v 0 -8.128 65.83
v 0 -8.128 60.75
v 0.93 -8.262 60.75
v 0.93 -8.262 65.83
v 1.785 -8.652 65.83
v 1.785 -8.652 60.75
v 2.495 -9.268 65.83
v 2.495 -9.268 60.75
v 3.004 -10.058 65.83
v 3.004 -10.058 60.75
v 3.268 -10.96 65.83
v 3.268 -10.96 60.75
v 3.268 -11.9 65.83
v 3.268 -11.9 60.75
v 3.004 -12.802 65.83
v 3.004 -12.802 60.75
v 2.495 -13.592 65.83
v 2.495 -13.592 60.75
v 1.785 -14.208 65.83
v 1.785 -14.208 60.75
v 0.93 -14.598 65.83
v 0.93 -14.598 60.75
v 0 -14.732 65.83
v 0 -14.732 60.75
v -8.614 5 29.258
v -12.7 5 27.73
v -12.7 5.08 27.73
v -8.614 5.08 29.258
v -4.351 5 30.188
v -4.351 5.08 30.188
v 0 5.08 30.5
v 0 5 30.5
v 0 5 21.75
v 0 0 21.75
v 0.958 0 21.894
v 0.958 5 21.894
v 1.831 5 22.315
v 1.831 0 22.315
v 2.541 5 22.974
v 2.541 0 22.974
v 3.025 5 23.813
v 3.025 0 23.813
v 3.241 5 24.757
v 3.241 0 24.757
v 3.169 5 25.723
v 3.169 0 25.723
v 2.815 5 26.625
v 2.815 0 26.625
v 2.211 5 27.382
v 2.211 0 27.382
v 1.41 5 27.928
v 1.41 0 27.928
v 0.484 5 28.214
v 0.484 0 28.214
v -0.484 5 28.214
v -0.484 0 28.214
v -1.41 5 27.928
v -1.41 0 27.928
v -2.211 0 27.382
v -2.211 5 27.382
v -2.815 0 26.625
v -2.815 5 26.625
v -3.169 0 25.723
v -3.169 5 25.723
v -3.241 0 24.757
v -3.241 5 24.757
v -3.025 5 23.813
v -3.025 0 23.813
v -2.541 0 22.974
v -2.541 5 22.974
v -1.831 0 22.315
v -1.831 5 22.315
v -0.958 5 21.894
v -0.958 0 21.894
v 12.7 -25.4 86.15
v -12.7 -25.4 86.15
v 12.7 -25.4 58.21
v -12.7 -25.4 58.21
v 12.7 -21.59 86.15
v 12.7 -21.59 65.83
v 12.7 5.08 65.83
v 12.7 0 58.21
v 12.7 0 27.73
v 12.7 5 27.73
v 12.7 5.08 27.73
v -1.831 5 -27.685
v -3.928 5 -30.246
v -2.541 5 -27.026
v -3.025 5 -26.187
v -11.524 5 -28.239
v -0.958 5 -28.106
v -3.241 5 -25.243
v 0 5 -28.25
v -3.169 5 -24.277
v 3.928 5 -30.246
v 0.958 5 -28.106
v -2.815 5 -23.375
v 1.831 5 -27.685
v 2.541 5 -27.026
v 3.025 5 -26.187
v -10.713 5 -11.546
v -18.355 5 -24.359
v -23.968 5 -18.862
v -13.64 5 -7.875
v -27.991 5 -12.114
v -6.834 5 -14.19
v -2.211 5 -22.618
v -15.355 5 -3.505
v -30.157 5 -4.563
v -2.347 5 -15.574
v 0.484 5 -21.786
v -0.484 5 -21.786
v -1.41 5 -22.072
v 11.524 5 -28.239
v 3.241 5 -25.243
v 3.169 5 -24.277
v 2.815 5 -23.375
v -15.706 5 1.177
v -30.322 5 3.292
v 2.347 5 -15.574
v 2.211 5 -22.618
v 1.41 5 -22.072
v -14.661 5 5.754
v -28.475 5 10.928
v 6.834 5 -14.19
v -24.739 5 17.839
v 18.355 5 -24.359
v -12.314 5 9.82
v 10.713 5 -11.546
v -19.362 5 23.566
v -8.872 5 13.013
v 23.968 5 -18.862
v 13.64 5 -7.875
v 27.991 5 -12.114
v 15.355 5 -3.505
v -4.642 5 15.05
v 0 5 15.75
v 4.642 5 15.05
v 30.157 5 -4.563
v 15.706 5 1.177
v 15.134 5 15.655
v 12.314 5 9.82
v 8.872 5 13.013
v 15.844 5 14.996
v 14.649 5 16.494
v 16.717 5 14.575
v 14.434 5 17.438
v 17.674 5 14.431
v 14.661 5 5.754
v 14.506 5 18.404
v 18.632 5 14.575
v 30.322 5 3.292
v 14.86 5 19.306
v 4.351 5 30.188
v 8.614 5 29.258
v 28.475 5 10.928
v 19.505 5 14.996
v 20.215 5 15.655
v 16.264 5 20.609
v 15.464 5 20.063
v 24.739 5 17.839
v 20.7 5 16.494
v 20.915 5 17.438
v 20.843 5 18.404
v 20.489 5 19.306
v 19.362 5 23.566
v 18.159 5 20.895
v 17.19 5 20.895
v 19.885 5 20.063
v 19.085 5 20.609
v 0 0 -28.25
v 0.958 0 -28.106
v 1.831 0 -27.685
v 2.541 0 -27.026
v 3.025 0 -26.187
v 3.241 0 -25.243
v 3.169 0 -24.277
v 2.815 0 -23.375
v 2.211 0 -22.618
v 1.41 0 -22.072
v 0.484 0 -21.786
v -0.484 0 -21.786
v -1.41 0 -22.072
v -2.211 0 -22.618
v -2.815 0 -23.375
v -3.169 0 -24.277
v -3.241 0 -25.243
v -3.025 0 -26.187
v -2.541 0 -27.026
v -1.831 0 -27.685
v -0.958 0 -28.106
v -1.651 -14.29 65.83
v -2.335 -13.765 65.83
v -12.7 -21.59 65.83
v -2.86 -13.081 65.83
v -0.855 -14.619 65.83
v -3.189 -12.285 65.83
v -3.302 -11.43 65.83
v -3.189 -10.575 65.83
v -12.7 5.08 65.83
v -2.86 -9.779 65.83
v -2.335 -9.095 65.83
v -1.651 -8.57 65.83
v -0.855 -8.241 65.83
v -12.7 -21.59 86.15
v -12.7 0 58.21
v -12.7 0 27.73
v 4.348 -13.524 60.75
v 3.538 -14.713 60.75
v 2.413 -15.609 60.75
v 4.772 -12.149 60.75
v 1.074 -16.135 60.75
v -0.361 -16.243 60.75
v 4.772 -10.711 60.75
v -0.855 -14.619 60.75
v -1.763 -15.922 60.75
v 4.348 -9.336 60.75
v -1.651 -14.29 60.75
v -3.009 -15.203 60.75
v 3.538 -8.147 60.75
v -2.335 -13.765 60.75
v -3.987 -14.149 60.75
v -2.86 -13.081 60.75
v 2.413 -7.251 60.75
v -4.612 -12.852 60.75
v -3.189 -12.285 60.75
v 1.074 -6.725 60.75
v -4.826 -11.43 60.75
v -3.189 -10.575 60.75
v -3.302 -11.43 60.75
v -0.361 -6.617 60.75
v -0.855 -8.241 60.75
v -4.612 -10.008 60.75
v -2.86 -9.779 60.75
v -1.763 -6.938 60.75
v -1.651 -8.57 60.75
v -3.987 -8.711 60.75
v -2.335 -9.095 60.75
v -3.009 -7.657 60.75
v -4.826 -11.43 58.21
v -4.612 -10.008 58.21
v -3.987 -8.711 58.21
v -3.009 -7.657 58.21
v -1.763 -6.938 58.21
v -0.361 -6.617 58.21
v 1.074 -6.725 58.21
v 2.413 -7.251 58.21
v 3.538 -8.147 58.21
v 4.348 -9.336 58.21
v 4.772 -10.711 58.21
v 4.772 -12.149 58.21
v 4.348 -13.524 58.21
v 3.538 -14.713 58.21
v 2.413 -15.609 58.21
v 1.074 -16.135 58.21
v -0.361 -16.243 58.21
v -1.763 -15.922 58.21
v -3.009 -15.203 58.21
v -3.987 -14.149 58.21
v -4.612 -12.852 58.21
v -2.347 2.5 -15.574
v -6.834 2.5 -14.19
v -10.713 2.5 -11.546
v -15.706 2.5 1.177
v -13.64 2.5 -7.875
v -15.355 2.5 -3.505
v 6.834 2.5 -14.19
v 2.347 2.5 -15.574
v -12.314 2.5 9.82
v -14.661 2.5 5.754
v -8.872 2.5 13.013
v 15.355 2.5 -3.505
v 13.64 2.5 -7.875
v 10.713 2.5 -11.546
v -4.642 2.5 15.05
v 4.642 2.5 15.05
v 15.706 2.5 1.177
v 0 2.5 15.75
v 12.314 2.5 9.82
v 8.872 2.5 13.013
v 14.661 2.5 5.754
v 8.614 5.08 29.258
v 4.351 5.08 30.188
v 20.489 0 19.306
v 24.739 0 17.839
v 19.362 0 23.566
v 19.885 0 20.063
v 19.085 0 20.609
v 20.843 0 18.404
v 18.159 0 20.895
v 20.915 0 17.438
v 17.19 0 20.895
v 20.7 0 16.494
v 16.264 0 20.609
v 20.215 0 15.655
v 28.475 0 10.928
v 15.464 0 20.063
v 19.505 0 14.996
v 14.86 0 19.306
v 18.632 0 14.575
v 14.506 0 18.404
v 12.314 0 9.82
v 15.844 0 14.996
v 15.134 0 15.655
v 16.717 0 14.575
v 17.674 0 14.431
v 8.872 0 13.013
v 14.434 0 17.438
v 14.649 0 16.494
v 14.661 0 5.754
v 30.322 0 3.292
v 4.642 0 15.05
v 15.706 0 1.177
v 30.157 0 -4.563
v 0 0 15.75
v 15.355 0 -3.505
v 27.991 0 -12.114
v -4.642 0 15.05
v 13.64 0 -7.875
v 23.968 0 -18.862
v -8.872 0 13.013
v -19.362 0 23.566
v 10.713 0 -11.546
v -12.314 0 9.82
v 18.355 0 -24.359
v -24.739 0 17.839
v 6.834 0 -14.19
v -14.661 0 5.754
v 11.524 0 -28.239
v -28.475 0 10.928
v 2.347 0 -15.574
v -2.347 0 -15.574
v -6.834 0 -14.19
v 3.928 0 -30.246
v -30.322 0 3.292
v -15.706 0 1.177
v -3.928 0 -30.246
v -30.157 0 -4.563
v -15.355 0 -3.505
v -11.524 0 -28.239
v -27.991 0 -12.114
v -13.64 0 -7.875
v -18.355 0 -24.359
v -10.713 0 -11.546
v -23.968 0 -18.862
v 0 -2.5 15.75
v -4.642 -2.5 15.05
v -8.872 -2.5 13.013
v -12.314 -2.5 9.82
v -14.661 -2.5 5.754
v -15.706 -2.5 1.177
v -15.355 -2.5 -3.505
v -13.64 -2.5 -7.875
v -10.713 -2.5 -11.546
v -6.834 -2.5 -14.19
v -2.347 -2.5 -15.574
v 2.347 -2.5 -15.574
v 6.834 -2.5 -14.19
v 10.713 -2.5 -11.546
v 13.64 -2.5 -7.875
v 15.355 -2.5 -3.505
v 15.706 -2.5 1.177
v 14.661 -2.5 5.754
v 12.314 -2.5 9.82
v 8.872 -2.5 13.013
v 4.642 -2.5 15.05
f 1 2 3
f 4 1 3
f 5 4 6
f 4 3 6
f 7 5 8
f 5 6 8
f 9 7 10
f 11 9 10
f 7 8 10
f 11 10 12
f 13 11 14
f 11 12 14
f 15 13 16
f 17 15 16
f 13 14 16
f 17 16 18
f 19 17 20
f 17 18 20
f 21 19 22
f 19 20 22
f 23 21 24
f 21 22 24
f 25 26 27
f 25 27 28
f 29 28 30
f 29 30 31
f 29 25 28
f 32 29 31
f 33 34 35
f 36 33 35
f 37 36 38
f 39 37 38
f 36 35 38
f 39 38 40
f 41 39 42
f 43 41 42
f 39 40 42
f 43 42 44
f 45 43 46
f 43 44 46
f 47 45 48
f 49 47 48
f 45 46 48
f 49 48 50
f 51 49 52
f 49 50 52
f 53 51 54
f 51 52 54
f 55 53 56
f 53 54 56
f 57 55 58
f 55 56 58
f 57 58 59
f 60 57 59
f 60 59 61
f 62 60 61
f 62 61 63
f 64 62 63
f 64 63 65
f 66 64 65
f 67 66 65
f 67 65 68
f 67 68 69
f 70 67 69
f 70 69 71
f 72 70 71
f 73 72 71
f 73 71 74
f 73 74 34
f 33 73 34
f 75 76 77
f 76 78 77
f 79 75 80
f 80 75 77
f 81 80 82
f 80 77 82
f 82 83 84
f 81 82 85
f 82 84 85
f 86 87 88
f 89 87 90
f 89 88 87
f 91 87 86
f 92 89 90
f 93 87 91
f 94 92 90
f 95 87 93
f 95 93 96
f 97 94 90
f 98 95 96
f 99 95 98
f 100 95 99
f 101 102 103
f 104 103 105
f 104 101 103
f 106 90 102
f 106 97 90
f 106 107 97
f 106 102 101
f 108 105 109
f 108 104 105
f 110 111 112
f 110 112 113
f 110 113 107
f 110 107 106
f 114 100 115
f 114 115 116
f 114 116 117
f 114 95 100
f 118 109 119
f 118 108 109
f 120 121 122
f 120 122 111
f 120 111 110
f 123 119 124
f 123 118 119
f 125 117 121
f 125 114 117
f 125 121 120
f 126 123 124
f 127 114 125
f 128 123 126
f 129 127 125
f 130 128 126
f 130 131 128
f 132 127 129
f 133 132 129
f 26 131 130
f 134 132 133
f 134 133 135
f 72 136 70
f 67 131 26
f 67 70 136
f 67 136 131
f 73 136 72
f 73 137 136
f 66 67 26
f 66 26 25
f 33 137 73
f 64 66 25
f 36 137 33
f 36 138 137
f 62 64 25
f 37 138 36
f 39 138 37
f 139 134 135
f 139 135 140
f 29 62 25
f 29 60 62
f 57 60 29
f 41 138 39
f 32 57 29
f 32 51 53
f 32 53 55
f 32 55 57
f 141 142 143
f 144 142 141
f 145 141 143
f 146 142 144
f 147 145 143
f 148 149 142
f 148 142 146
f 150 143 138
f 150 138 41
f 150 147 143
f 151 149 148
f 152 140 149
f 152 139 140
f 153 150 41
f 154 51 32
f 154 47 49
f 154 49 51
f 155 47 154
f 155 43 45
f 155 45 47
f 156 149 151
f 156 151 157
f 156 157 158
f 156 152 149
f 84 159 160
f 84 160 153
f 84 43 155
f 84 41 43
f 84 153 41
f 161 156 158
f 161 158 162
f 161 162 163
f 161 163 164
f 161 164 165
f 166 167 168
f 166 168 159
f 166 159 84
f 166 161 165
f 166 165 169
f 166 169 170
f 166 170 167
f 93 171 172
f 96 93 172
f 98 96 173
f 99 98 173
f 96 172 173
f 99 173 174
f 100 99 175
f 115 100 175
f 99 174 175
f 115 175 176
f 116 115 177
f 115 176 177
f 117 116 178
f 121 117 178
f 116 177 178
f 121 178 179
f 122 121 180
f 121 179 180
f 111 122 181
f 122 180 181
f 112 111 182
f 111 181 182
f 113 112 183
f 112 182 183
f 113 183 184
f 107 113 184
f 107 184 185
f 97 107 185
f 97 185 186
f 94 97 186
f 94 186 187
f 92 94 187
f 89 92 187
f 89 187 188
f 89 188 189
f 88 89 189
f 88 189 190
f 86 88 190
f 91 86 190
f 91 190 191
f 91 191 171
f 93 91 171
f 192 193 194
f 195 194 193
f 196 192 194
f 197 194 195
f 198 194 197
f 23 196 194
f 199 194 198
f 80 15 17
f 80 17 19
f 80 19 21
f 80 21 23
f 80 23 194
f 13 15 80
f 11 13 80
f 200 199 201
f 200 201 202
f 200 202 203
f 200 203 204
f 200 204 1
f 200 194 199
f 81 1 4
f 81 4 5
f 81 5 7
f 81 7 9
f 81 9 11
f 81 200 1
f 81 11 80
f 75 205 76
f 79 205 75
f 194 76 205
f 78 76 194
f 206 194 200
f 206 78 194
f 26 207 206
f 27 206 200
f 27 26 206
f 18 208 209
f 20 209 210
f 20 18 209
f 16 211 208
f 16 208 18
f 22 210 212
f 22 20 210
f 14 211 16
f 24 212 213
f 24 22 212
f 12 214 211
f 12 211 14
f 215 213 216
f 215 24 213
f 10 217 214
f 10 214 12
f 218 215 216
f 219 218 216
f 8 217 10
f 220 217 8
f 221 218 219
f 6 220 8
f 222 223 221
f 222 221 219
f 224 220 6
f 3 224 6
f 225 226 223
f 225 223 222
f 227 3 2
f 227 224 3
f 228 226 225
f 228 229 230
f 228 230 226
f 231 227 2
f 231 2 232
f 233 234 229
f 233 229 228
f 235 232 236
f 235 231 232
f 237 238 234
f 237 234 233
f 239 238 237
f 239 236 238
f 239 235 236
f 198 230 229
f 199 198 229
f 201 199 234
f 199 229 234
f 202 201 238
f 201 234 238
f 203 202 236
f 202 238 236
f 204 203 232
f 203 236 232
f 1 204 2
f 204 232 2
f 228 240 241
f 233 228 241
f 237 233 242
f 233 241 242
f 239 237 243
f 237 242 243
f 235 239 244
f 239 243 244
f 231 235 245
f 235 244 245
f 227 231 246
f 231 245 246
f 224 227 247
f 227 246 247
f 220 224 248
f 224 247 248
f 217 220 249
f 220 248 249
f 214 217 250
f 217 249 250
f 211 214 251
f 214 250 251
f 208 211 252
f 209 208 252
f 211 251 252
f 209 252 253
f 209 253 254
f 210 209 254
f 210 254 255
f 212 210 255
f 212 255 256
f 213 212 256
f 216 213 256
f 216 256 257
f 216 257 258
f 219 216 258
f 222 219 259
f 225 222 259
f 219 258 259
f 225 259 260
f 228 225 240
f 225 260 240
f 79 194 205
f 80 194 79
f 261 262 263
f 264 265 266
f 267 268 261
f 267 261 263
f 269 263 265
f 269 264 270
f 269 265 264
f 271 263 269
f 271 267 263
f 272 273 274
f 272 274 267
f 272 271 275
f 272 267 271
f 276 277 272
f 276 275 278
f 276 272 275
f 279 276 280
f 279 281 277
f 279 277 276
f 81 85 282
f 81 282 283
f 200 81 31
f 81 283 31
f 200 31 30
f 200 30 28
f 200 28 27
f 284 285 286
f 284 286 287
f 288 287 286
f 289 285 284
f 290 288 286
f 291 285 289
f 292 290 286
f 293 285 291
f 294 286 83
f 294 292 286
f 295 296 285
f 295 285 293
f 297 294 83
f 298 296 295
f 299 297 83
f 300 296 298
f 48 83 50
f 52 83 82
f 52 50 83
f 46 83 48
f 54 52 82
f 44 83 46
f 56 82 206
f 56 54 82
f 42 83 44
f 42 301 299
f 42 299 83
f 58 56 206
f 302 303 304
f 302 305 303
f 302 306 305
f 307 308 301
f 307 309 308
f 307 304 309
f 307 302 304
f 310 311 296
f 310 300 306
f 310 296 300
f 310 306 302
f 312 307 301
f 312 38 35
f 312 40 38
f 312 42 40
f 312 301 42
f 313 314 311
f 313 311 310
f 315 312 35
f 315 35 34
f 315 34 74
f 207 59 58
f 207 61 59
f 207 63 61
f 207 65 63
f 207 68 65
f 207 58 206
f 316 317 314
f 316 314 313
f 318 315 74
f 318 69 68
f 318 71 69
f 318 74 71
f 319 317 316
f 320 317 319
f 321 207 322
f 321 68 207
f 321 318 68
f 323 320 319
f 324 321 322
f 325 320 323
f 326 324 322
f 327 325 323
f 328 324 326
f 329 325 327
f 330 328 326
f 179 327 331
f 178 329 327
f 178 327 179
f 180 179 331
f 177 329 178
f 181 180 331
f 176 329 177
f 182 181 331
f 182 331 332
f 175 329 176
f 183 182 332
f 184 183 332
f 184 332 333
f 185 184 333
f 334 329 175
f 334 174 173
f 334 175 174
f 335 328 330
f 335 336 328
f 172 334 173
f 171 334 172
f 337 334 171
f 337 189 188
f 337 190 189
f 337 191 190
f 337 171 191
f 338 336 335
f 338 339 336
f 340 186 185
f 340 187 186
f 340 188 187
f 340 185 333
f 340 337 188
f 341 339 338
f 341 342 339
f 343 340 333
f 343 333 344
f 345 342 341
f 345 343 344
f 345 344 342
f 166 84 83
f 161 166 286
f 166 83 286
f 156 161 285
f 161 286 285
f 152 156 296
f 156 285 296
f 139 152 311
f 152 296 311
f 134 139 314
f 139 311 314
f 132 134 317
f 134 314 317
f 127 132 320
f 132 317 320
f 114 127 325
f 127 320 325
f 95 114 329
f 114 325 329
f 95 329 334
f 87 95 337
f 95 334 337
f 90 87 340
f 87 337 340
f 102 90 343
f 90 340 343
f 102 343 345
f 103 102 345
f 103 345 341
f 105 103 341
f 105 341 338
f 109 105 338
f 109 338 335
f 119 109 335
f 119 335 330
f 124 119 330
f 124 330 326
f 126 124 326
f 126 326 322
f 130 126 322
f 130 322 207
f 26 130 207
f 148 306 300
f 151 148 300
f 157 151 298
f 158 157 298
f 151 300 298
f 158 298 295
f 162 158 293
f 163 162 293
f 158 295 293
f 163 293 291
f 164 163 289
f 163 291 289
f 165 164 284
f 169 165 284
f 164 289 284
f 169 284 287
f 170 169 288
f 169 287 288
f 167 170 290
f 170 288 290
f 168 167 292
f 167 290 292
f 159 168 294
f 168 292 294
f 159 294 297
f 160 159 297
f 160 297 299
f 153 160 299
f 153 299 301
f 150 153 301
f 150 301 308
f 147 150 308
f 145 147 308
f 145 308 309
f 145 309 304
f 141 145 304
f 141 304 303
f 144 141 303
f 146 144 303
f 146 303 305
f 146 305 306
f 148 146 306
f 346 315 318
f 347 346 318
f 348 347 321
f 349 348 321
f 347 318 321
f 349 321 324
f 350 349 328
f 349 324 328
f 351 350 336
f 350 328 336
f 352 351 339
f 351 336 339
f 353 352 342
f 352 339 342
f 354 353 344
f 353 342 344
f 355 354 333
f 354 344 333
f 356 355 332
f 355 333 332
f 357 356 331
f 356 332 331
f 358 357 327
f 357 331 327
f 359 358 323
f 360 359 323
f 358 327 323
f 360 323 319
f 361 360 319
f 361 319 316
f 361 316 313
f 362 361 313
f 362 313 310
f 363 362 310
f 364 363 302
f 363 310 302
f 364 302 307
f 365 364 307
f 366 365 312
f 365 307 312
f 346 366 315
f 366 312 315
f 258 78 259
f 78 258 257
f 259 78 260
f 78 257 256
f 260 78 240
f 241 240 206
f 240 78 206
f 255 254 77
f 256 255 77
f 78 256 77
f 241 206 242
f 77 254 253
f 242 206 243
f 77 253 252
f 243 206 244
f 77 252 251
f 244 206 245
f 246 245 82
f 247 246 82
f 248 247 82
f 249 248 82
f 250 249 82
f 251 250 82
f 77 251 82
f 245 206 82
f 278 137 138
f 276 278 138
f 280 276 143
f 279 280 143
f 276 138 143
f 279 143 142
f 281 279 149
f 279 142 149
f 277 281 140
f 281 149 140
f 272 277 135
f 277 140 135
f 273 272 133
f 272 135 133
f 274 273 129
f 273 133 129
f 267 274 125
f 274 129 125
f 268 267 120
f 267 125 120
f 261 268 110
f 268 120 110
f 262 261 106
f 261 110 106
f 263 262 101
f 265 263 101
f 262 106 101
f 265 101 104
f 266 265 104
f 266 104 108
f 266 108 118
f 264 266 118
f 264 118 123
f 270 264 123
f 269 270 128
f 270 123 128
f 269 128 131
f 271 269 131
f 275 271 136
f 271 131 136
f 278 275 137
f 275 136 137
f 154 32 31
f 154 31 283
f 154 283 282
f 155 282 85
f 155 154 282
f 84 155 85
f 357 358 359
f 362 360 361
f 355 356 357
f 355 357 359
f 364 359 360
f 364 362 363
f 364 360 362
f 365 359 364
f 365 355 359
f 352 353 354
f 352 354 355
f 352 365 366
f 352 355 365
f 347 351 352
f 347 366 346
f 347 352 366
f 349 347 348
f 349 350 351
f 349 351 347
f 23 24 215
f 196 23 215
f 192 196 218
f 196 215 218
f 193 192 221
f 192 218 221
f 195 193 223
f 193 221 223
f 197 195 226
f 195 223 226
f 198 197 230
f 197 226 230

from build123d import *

# Parameters (mm, degrees)
SKETCH1_R           = 30.5
BOSS_EXTRUDE1_DEPTH = 5
SKETCH2_R           = 15.75
CUT_EXTRUDE1_DEPTH  = 2.5
SKETCH3_R           = 15.75
BOSS_EXTRUDE2_DEPTH = 2.5
SKETCH4_R           = 3.25
CUT_EXTRUDE2_DEPTH  = 5.08
SKETCH5_R           = 3.25
CUT_EXTRUDE3_DEPTH  = 5.08
SKETCH6_R           = 3.25
CUT_EXTRUDE4_DEPTH  = 5.08
BOSS_EXTRUDE3_DEPTH = 5.08
SKETCH8_W           = 25.4
SKETCH8_H           = 7.62
BOSS_EXTRUDE4_DEPTH = 25.4
SKETCH9_W           = 25.4
SKETCH9_H           = 3.81
BOSS_EXTRUDE5_DEPTH = 20.32
CUT_EXTRUDE5_DEPTH  = 7.62
SKETCH11_R          = 4.826
CUT_EXTRUDE6_DEPTH  = 2.54


with BuildPart() as part:
    # Sketch1 → Boss-Extrude1 (new body)
    with BuildSketch(Plane(origin=(0, 0, 0), x_dir=(1, 0, 0), z_dir=(0, 1, 0))):
        with Locations(Location((0, 0, 0), (0, 0, 270))):
            Circle(SKETCH1_R)
    extrude(amount=BOSS_EXTRUDE1_DEPTH)

    # Sketch2 → Cut-Extrude1 (cut)
    with BuildSketch(Plane(origin=(0, 5, 0), x_dir=(1, 0, 0), z_dir=(0, 1, 0))):
        with Locations(Location((0, 0, 0), (0, 0, 270))):
            Circle(SKETCH2_R)
    extrude(amount=-CUT_EXTRUDE1_DEPTH, mode=Mode.SUBTRACT)

    # Sketch3 → Boss-Extrude2 (add)
    with BuildSketch(Plane.XZ):
        with Locations(Location((0, 0, 0), (0, 0, 90))):
            Circle(SKETCH3_R)
    extrude(amount=BOSS_EXTRUDE2_DEPTH)

    # Sketch4 → Cut-Extrude2 (cut)
    with BuildSketch(Plane(origin=(0, 0, 0), x_dir=(-1, 0, 0), z_dir=(0, -1, 0))):
        with Locations(Location((0, 25, 0), (0, 0, 90))):
            Circle(SKETCH4_R)
    extrude(amount=-CUT_EXTRUDE2_DEPTH, mode=Mode.SUBTRACT)

    # Sketch5 → Cut-Extrude3 (cut)
    with BuildSketch(Plane.XZ):
        with Locations(Location((0, 25, 0), (0, 0, 270))):
            Circle(SKETCH5_R)
    extrude(amount=-CUT_EXTRUDE3_DEPTH, mode=Mode.SUBTRACT)

    # Sketch6 → Cut-Extrude4 (cut)
    with BuildSketch(Plane.XZ):
        with Locations(Location((17.674476483, 17.680862, 0), (0, 0, 270))):
            Circle(SKETCH6_R)
    extrude(amount=-CUT_EXTRUDE4_DEPTH, mode=Mode.SUBTRACT)

    # Sketch7 → Boss-Extrude3 (add)
    with BuildSketch(Plane(origin=(0, 0, 0), x_dir=(-1, 0, 0), z_dir=(0, -1, 0))):
        with BuildLine():
            ThreePointArc((12.7, -27.73012802), (6.499272859, -29.79948745), (0, -30.5))
            ThreePointArc((0, -30.5), (-6.499272859, -29.79948745), (-12.7, -27.73012802))
            Line((-12.7, -27.73012802), (-12.7, -65.83012802))
            Line((-12.7, -65.83012802), (12.7, -65.83012802))
            Line((12.7, -65.83012802), (12.7, -27.73012802))
        make_face()
    extrude(amount=-BOSS_EXTRUDE3_DEPTH)

    # Sketch8 → Boss-Extrude4 (add)
    with BuildSketch(Plane.XZ):
        with Locations((0, 62.02012802)):
            Rectangle(SKETCH8_W, SKETCH8_H)
    extrude(amount=BOSS_EXTRUDE4_DEPTH)

    # Sketch9 → Boss-Extrude5 (add)
    with BuildSketch(Plane.XY.offset(65.83012802)):
        with Locations((0, -23.495)):
            Rectangle(SKETCH9_W, SKETCH9_H)
    extrude(amount=BOSS_EXTRUDE5_DEPTH)

    # Sketch10 → Cut-Extrude5 (cut)
    with BuildSketch(Plane(origin=(0, 0, 58.21012802), x_dir=(-1, 0, 0), z_dir=(0, 0, -1))):
        with BuildLine():
            ThreePointArc((0, -8.128), (-3.302, -11.43), (0, -14.732))
            Line((0, -14.732), (0, -8.128))
        make_face()
        with BuildLine():
            Line((0, -8.128), (0, -14.732))
            ThreePointArc((0, -14.732), (2.334866591, -13.764866591), (3.302, -11.43))
            ThreePointArc((3.302, -11.43), (2.334866591, -9.095133409), (0, -8.128))
        make_face()
    extrude(amount=-CUT_EXTRUDE5_DEPTH, mode=Mode.SUBTRACT)

    # Sketch11 → Cut-Extrude6 (cut)
    with BuildSketch(Plane(origin=(0, 0, 58.21012802), x_dir=(-1, 0, 0), z_dir=(0, 0, -1))):
        with Locations((0, -11.43)):
            Circle(SKETCH11_R)
    extrude(amount=-CUT_EXTRUDE6_DEPTH, mode=Mode.SUBTRACT)


solid = part.part
